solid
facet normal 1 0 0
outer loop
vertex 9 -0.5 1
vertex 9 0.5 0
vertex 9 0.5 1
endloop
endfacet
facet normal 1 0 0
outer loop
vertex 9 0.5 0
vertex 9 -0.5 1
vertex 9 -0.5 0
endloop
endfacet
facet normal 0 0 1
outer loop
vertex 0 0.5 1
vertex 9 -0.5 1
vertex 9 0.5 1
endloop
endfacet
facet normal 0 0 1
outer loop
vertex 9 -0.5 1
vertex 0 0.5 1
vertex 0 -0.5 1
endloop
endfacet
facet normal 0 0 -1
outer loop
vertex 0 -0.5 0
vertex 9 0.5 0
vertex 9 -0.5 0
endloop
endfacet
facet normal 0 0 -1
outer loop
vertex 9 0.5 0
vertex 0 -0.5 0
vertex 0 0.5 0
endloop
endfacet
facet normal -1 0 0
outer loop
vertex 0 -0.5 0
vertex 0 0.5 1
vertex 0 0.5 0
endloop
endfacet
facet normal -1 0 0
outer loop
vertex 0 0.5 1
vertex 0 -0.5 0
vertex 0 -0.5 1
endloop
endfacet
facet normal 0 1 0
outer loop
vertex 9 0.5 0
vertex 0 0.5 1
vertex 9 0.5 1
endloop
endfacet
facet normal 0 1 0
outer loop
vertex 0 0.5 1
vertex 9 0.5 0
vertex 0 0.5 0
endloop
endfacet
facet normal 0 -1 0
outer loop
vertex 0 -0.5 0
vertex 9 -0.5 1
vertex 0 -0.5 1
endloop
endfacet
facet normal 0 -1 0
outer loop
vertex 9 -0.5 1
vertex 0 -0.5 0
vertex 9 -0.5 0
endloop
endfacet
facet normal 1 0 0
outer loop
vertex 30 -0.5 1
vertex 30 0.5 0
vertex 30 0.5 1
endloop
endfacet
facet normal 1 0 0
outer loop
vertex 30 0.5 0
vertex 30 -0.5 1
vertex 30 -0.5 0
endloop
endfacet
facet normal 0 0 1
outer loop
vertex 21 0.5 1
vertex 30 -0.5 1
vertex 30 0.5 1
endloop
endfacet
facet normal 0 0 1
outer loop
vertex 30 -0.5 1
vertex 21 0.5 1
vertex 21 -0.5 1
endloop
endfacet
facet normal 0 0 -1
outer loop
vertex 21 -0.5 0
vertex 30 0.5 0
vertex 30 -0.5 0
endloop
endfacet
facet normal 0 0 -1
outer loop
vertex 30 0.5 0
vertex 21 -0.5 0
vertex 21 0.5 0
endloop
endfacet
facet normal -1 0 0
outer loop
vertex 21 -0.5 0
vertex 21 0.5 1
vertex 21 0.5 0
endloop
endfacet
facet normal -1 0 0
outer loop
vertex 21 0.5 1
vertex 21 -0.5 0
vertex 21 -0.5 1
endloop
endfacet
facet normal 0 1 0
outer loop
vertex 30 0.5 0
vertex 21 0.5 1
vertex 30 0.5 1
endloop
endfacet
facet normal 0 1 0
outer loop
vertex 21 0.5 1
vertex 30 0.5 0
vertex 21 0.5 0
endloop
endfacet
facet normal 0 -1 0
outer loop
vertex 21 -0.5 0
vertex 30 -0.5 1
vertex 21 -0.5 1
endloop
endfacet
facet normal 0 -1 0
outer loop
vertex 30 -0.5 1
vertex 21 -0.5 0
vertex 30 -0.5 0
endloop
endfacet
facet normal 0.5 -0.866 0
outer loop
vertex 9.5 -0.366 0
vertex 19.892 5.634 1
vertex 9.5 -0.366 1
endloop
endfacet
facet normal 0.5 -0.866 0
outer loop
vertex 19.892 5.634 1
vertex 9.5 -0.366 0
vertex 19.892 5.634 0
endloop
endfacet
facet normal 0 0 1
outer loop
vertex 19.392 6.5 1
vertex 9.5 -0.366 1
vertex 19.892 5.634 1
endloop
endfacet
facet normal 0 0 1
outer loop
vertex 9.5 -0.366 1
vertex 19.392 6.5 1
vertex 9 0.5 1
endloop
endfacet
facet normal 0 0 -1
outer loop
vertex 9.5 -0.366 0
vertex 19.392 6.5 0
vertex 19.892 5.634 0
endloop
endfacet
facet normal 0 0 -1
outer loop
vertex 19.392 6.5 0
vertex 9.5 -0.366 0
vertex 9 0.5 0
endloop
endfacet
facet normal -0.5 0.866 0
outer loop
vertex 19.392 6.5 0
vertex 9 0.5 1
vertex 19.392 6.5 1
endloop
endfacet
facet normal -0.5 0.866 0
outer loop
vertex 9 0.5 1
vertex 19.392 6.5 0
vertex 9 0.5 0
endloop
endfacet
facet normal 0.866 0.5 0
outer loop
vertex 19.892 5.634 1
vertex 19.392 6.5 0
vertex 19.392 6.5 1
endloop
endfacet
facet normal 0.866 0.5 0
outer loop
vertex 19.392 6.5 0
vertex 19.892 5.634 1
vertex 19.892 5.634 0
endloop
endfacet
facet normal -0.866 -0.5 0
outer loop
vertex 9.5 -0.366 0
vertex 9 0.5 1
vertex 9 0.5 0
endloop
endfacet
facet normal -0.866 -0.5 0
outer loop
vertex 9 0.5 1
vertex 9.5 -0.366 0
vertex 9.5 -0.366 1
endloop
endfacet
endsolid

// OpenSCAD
// no = normally open
module switch_no(length, width, thickness, height)
{
    translate([0,-thickness/2,0])cube([length/2-width/2, thickness, height]);
    translate([(length/2+width/2),-thickness/2,0])cube([(length/2-width/2), thickness, height]);
    
    translate([(length/2-width/2),+thickness/2, 0])rotate([0,0,-60])cube([thickness, width, height]);
    
}

switch_no(30, 12, 1, 1);
